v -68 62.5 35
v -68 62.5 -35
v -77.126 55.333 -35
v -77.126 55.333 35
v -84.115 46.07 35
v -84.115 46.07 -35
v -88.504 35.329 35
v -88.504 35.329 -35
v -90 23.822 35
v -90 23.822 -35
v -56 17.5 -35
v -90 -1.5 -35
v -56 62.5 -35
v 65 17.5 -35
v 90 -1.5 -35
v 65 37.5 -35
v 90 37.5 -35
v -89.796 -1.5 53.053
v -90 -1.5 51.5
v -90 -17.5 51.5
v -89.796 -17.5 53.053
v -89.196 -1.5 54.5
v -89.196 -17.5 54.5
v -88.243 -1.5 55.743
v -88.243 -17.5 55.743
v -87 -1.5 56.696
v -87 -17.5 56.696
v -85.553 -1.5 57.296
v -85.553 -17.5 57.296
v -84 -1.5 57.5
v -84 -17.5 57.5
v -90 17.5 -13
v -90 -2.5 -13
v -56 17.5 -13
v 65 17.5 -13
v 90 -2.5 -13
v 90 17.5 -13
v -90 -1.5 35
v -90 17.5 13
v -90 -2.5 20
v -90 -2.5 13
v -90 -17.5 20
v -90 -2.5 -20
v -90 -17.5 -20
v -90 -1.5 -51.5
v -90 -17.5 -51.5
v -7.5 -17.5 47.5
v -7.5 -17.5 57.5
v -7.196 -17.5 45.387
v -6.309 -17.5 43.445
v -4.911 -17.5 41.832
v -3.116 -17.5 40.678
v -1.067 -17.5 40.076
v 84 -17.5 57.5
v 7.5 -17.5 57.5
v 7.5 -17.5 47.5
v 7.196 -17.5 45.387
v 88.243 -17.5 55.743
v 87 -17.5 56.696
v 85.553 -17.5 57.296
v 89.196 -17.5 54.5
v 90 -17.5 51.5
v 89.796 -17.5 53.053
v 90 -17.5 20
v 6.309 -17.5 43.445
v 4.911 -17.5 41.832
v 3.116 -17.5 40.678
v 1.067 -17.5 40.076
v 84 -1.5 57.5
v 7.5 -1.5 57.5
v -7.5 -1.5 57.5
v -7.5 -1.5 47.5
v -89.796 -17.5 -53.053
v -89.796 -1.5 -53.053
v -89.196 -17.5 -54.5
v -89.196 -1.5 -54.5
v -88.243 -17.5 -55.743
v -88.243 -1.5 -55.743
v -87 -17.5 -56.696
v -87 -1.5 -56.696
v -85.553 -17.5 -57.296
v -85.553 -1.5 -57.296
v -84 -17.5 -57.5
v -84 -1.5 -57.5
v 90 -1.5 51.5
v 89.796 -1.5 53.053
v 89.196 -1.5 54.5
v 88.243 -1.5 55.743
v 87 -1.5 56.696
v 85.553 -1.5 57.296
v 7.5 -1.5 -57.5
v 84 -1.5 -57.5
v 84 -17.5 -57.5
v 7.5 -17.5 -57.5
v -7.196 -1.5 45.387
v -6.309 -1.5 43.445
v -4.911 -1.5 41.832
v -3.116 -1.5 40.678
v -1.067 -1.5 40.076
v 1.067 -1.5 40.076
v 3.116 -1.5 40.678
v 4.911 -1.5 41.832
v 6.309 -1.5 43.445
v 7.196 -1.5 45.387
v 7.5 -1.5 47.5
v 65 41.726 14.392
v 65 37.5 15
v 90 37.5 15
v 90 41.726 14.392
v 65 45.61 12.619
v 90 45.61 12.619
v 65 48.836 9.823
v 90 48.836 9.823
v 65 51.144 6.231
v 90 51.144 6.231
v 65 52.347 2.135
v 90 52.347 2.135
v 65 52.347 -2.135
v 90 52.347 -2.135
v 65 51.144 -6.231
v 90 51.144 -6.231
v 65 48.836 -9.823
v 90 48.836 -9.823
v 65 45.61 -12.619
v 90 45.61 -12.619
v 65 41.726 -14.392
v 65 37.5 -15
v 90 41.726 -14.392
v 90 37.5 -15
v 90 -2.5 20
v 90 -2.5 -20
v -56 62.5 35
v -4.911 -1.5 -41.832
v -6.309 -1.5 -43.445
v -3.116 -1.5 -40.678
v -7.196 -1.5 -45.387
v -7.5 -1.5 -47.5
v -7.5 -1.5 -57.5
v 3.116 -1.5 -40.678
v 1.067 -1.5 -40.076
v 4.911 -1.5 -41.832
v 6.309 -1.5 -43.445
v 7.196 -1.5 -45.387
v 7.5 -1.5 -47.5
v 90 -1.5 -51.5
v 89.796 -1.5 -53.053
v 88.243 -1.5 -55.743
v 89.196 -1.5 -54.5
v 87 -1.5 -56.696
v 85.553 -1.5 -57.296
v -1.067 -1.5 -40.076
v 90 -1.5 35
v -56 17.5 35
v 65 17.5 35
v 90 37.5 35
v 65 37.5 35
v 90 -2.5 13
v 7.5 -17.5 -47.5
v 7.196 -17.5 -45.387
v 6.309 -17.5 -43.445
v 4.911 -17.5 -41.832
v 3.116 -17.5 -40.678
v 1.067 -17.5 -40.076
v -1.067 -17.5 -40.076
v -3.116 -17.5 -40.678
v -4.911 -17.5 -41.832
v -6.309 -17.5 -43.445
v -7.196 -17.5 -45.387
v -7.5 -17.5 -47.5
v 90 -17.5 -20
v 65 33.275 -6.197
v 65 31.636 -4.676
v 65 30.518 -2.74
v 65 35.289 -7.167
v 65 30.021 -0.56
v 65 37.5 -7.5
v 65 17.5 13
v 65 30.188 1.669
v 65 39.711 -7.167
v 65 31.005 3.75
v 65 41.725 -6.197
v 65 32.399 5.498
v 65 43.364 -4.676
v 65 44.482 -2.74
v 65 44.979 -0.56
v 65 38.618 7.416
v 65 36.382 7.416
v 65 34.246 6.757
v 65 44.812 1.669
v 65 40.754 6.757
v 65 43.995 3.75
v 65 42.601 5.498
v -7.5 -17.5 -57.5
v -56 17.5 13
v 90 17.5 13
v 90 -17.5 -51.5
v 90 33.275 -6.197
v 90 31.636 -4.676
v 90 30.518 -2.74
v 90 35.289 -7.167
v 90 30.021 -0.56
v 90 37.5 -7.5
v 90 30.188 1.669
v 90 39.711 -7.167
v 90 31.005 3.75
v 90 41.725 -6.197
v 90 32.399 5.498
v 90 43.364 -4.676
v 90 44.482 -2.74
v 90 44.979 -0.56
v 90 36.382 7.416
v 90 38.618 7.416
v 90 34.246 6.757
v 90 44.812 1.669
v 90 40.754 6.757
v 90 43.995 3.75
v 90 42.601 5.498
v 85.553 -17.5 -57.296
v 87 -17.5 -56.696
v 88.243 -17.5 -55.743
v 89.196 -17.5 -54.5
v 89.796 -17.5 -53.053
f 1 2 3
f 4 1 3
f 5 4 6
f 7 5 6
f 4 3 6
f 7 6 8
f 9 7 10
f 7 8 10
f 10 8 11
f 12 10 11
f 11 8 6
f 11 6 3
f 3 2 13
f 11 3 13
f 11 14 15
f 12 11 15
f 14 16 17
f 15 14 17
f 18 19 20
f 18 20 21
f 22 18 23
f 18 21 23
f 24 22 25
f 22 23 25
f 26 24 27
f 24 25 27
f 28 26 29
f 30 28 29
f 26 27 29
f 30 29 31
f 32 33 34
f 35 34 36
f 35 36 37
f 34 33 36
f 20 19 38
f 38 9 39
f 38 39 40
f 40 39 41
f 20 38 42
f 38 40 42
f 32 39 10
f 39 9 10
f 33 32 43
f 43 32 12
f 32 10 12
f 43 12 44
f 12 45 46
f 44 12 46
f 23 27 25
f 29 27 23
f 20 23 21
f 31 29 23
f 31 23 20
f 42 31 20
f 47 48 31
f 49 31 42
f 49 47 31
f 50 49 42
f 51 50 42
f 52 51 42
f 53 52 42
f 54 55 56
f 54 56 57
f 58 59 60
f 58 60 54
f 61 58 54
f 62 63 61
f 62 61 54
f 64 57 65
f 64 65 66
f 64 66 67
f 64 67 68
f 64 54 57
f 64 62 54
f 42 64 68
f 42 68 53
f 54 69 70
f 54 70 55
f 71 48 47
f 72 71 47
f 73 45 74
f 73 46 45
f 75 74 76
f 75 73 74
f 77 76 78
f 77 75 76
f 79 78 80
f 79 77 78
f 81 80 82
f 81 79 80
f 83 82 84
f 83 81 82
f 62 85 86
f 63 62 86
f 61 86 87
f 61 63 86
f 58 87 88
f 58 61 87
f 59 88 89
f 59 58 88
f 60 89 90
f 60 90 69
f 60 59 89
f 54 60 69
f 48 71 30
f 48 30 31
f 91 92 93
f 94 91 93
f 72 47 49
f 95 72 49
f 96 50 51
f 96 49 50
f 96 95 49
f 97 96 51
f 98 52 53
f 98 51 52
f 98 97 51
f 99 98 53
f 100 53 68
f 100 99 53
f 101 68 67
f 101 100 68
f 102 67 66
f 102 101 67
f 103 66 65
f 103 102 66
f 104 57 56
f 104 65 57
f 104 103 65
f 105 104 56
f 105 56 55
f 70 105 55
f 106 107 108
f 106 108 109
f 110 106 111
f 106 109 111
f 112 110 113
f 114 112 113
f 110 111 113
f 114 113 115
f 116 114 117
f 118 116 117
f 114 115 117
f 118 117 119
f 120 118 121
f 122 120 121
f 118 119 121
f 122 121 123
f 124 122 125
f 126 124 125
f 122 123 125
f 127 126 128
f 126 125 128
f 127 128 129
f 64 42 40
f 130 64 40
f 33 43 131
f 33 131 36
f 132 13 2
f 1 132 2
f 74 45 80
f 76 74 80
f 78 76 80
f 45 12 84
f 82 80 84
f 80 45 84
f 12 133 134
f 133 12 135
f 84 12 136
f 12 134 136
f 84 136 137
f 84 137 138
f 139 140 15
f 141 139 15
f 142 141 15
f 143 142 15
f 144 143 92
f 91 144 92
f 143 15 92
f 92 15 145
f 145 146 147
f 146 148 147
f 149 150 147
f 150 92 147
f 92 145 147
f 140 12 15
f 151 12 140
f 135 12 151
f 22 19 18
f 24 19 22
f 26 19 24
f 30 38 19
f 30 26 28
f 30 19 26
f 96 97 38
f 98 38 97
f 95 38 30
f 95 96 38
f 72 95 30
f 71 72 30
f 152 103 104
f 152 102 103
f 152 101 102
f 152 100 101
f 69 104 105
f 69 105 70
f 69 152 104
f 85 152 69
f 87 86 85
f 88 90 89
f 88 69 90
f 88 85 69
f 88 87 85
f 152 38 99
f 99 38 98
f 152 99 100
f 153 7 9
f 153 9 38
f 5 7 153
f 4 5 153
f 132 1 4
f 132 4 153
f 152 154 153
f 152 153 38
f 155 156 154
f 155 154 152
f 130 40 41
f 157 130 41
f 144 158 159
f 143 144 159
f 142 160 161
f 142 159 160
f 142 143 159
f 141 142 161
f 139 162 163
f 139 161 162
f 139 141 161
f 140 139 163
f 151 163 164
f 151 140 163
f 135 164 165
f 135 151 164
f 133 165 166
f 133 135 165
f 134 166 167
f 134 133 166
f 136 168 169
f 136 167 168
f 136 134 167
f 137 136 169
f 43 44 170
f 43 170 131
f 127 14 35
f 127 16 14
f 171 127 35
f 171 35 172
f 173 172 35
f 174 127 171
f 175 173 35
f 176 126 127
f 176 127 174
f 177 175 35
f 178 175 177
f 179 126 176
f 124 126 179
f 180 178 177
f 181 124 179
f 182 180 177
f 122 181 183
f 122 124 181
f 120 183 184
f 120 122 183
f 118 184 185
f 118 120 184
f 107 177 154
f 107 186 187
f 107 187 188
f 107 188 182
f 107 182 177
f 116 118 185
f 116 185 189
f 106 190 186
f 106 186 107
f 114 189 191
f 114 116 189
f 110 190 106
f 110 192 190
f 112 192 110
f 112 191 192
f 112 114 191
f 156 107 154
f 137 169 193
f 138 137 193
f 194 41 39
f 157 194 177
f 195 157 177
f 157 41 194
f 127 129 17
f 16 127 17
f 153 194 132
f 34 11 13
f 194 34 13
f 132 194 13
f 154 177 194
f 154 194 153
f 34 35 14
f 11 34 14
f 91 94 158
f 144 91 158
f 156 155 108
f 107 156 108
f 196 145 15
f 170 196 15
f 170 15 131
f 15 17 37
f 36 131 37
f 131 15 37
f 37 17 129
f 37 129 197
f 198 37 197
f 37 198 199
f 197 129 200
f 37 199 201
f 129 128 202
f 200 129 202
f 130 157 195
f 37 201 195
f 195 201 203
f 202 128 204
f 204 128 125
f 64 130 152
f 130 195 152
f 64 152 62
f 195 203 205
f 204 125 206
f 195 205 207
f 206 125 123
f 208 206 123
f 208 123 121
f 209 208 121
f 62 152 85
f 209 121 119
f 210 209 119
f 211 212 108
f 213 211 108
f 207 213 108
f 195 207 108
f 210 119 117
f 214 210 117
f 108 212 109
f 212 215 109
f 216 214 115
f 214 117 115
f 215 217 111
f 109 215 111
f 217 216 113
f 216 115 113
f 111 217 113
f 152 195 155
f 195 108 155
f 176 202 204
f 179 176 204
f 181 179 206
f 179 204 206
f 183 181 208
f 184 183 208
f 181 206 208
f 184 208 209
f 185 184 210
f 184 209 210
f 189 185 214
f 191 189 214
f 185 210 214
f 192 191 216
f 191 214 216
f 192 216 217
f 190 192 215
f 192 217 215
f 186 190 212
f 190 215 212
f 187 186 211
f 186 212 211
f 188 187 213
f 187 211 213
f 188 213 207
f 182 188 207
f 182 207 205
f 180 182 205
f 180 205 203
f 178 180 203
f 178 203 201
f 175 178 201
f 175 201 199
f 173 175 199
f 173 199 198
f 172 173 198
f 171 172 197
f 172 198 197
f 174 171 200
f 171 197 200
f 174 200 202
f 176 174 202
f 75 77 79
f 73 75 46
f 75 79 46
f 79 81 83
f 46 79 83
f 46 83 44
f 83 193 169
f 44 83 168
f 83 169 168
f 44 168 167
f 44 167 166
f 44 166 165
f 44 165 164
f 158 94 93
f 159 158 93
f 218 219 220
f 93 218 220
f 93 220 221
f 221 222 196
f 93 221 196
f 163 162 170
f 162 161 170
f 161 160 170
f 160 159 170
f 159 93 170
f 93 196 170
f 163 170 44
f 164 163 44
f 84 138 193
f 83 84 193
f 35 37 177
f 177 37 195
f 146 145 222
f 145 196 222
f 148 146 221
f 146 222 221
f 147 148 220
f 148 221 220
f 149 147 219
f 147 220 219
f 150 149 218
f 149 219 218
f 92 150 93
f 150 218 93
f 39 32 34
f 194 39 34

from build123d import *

# Parameters (mm, degrees)
BOSS_EXTRUDE1_DEPTH   = 90
BOSS_EXTRUDE1_2_DEPTH = 90
SKETCH2_R             = 7.5
BOSS_EXTRUDE2_DEPTH   = 25
BOSS_EXTRUDE3_DEPTH   = 70
FILLET1_R             = 6
CUT_EXTRUDE1_DEPTH    = 18.5


with BuildPart() as part:
    # Sketch1 → Boss-Extrude1 (new body, symmetric)
    with BuildSketch(Plane(origin=(0, 0, 0), x_dir=(0, 0, -1), z_dir=(1, 0, 0))):
        Polygon((13, 17.5), (35, 17.5), (35, -1.5), (57.5, -1.5), (57.5, -17.5), (20, -17.5), (20, -2.5), (13, -2.5), align=None)
    extrude(amount=BOSS_EXTRUDE1_DEPTH, both=True)



with BuildPart() as body_2:
    # Sketch1 → Boss-Extrude1 2 (new body, symmetric)
    with BuildSketch(Plane(origin=(0, 0, 0), x_dir=(0, 0, -1), z_dir=(1, 0, 0))):
        Polygon((-13, -2.5), (-13, 17.5), (-35, 17.5), (-35, -1.5), (-57.5, -1.5), (-57.5, -17.5), (-20, -17.5), (-20, -2.5), align=None)
    extrude(amount=BOSS_EXTRUDE1_2_DEPTH, both=True)


with BuildPart() as part_1:
    add(part.part)

    add(body_2.part)  # Boss-Extrude2 merges body 2
    # Sketch2 → Boss-Extrude2 (add)
    with BuildSketch(Plane(origin=(90, 0, 0), x_dir=(0, 0, -1), z_dir=(1, 0, 0))):
        with BuildLine():
            Line((35, 17.5), (-35, 17.5))
            Line((-35, 17.5), (-35, 37.5))
            Line((-35, 37.5), (-15, 37.5))
            ThreePointArc((-15, 37.5), (0, 52.5), (15, 37.5))
            Line((15, 37.5), (35, 37.5))
            Line((35, 37.5), (35, 17.5))
        make_face()
        with Locations((0, 37.5)):
            Circle(SKETCH2_R, mode=Mode.SUBTRACT)
    extrude(amount=-BOSS_EXTRUDE2_DEPTH)

    # Sketch3 → Boss-Extrude3 (add)
    with BuildSketch(Plane(origin=(0, 0, -35), x_dir=(-1, 0, 0), z_dir=(0, 0, -1))):
        with BuildLine():
            Line((90, 17.5), (56, 17.5))
            Line((56, 17.5), (56, 62.5))
            Line((56, 62.5), (68, 62.5))
            ThreePointArc((68, 62.5), (84.115214431, 46.07043625), (90, 23.821840788))
            Line((90, 23.821840788), (90, 17.5))
        make_face()
    extrude(amount=-BOSS_EXTRUDE3_DEPTH)

    # Fillet1
    fillet1_edges = [part_1.edges().sort_by_distance(p)[0] for p in [
        (90, -9.5, -57.5),
        (-90, -9.5, 57.5),
        (90, -9.5, 57.5),
        (-90, -9.5, -57.5),
    ]]
    fillet(fillet1_edges, radius=FILLET1_R)

    # Sketch4 → Cut-Extrude1 (cut, through all)
    with BuildSketch(Plane(origin=(0, 0, 0), x_dir=(1, 0, 0), z_dir=(0, 1, 0))):
        with BuildLine():
            Line((7.5, 67.5), (7.5, 47.5))
            ThreePointArc((7.5, 47.5), (0, 40), (-7.5, 47.5))
            Line((-7.5, 47.5), (-7.5, 67.5))
            ThreePointArc((-7.5, 67.5), (0, 75), (7.5, 67.5))
        make_face()
        with BuildLine():
            Line((-7.5, -67.5), (-7.5, -47.5))
            ThreePointArc((-7.5, -47.5), (0, -40), (7.5, -47.5))
            Line((7.5, -47.5), (7.5, -67.5))
            ThreePointArc((7.5, -67.5), (0, -75), (-7.5, -67.5))
        make_face()
    extrude(amount=-CUT_EXTRUDE1_DEPTH, mode=Mode.SUBTRACT)


solid = part_1.part
